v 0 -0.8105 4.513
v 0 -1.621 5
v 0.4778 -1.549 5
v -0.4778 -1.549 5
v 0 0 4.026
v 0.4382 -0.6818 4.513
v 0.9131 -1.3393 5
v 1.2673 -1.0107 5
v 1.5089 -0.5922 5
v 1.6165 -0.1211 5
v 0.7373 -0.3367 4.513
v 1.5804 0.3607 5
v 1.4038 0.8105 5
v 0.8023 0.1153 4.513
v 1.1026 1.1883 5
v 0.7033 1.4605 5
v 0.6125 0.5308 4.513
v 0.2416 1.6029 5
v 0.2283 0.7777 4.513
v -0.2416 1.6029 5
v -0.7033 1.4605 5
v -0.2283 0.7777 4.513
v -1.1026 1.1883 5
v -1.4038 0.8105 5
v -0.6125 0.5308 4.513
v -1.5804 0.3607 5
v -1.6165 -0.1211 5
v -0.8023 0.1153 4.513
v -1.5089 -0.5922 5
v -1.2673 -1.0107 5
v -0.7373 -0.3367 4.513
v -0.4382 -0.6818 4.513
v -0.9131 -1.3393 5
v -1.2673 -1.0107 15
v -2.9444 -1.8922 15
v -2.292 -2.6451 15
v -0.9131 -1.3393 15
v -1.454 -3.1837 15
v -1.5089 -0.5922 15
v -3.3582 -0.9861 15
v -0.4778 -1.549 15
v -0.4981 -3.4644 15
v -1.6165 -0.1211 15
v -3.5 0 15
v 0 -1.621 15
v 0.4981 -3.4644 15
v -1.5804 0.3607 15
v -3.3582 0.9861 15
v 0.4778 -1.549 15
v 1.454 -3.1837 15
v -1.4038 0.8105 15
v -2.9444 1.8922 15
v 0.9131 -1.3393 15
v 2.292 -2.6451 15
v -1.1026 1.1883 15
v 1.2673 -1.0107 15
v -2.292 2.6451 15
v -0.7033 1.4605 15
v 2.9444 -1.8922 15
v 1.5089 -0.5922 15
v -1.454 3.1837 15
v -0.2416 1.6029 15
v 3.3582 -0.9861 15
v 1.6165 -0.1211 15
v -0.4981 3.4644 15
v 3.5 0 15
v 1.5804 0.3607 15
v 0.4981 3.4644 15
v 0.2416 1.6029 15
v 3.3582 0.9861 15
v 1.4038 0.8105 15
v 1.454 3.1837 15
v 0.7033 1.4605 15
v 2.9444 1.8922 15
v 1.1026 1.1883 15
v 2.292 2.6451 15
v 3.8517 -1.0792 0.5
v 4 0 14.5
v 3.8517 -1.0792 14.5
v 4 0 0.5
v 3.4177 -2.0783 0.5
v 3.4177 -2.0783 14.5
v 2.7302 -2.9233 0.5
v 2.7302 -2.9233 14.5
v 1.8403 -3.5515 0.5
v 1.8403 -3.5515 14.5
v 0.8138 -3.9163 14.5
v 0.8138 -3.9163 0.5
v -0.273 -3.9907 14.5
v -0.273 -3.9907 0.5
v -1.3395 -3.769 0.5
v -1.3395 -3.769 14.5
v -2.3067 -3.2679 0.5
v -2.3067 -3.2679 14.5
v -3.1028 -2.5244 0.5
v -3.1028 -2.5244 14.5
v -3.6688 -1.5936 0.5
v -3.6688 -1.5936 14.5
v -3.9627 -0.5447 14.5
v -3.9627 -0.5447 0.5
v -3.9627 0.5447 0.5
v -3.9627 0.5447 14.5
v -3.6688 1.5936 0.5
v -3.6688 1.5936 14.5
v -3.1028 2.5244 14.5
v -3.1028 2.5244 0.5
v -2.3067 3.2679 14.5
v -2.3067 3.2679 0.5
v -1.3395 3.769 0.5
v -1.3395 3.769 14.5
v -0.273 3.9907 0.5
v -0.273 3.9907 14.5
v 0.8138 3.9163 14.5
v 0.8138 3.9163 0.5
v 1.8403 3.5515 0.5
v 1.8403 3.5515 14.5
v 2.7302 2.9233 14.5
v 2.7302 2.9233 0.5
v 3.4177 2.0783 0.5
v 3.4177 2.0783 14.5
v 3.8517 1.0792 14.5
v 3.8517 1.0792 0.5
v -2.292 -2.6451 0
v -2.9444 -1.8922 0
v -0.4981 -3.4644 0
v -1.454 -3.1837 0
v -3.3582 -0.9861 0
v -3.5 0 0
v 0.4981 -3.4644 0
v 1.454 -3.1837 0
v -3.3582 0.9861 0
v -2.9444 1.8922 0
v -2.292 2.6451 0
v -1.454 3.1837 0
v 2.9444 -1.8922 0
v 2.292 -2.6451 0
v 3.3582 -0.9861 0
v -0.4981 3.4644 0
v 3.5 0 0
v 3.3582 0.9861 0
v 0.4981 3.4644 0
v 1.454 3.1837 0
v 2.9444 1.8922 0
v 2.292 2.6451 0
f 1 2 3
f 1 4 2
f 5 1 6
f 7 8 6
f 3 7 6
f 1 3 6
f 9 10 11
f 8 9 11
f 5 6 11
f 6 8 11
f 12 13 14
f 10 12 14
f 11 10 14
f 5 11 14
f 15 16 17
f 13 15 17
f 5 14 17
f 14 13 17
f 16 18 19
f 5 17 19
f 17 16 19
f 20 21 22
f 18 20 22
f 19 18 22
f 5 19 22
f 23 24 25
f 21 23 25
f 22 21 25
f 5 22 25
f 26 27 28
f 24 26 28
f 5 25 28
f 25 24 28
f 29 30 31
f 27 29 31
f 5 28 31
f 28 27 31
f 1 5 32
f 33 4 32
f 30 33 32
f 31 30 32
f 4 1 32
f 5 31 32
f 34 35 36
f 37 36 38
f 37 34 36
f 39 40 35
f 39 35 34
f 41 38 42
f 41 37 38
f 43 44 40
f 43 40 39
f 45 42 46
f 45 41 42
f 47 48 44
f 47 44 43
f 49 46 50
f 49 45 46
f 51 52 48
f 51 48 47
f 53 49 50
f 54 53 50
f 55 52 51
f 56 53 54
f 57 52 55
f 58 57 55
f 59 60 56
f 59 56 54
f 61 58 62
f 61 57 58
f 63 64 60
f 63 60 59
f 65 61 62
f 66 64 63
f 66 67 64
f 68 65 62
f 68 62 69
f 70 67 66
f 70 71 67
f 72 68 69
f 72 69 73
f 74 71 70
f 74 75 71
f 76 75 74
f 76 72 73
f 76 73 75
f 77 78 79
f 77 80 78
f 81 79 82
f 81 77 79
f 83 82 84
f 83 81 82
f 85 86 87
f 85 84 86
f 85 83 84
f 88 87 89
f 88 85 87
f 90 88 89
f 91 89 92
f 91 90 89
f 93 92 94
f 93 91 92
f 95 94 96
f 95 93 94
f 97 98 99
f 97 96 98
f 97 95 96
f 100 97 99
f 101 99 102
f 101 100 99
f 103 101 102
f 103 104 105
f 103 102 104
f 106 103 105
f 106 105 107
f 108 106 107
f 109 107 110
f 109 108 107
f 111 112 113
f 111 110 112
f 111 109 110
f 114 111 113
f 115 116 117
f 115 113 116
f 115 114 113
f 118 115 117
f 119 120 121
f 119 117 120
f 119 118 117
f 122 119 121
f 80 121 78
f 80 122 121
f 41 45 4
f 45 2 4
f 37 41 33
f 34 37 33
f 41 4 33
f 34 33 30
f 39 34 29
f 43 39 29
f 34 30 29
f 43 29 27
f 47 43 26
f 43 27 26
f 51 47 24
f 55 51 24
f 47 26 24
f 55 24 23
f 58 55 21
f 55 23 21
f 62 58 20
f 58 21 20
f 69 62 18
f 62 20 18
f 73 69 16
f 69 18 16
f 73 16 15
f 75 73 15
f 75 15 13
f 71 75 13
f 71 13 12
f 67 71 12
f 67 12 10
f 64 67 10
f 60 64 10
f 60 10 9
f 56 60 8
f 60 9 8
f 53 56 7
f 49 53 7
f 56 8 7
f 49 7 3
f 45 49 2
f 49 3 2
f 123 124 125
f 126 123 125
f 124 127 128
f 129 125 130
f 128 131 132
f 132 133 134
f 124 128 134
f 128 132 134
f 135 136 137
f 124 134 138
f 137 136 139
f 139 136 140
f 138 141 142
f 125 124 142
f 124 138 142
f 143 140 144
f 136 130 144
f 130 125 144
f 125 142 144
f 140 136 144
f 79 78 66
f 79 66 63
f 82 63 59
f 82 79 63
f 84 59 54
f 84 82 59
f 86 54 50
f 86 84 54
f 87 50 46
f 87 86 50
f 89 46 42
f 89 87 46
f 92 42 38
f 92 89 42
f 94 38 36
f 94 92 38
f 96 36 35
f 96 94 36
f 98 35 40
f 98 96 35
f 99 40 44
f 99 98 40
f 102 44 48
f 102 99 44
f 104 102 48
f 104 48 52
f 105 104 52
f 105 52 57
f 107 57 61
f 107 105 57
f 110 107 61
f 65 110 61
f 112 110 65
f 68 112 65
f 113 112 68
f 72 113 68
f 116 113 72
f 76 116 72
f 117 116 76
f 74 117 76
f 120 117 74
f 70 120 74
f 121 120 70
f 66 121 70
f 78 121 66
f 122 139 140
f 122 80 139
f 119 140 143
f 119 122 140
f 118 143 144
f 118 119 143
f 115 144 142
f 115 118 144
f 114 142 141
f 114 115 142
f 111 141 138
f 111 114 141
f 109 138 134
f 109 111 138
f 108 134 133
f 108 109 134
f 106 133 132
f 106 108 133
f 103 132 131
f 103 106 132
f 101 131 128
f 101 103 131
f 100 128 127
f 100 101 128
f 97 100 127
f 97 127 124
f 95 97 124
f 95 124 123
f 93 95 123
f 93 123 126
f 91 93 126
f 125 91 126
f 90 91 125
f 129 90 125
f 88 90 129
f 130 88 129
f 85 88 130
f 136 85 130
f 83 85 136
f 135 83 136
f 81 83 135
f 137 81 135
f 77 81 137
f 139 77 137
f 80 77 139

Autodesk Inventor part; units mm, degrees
ref_plane "YZ Plane" through (0, 0, 0) normal (1, 0, 0) x (0, 1, 0)
ref_plane "XZ Plane" through (0, 0, 0) normal (0, 1, 0) x (-1, 0, 0)
ref_plane "XY Plane" through (0, 0, 0) normal (0, 0, 1) x (1, 0, 0)
sketch "Skizze1" plane through (0, 0, 0) normal (0, 0, 1) x (1, 0, 0)
  circle A0 centre (0, 0) radius 4
  dimension "d0" = 8
extrude "Extrusion1" add sketch "Skizze1" along normal blind 15
chamfer "Fase1" distance 0.5 angle 45 2 edges at (-4, 0, 15) (-4, 0, 0)
sketch "Skizze2" plane through (0, 0, 15) normal (0, 0, 1) x (1, 0, 0)
  circle A0 centre (0, 0) radius 3.5 projected
hole "Bohrung1" at (0, 0, 15) direction (0, 0, -1) diameter 3.242 depth 10 tip angle 118 thread size "M4x0.7" class "6H" standard "ISO Metric profile"
properties part number "1_0204_008"
